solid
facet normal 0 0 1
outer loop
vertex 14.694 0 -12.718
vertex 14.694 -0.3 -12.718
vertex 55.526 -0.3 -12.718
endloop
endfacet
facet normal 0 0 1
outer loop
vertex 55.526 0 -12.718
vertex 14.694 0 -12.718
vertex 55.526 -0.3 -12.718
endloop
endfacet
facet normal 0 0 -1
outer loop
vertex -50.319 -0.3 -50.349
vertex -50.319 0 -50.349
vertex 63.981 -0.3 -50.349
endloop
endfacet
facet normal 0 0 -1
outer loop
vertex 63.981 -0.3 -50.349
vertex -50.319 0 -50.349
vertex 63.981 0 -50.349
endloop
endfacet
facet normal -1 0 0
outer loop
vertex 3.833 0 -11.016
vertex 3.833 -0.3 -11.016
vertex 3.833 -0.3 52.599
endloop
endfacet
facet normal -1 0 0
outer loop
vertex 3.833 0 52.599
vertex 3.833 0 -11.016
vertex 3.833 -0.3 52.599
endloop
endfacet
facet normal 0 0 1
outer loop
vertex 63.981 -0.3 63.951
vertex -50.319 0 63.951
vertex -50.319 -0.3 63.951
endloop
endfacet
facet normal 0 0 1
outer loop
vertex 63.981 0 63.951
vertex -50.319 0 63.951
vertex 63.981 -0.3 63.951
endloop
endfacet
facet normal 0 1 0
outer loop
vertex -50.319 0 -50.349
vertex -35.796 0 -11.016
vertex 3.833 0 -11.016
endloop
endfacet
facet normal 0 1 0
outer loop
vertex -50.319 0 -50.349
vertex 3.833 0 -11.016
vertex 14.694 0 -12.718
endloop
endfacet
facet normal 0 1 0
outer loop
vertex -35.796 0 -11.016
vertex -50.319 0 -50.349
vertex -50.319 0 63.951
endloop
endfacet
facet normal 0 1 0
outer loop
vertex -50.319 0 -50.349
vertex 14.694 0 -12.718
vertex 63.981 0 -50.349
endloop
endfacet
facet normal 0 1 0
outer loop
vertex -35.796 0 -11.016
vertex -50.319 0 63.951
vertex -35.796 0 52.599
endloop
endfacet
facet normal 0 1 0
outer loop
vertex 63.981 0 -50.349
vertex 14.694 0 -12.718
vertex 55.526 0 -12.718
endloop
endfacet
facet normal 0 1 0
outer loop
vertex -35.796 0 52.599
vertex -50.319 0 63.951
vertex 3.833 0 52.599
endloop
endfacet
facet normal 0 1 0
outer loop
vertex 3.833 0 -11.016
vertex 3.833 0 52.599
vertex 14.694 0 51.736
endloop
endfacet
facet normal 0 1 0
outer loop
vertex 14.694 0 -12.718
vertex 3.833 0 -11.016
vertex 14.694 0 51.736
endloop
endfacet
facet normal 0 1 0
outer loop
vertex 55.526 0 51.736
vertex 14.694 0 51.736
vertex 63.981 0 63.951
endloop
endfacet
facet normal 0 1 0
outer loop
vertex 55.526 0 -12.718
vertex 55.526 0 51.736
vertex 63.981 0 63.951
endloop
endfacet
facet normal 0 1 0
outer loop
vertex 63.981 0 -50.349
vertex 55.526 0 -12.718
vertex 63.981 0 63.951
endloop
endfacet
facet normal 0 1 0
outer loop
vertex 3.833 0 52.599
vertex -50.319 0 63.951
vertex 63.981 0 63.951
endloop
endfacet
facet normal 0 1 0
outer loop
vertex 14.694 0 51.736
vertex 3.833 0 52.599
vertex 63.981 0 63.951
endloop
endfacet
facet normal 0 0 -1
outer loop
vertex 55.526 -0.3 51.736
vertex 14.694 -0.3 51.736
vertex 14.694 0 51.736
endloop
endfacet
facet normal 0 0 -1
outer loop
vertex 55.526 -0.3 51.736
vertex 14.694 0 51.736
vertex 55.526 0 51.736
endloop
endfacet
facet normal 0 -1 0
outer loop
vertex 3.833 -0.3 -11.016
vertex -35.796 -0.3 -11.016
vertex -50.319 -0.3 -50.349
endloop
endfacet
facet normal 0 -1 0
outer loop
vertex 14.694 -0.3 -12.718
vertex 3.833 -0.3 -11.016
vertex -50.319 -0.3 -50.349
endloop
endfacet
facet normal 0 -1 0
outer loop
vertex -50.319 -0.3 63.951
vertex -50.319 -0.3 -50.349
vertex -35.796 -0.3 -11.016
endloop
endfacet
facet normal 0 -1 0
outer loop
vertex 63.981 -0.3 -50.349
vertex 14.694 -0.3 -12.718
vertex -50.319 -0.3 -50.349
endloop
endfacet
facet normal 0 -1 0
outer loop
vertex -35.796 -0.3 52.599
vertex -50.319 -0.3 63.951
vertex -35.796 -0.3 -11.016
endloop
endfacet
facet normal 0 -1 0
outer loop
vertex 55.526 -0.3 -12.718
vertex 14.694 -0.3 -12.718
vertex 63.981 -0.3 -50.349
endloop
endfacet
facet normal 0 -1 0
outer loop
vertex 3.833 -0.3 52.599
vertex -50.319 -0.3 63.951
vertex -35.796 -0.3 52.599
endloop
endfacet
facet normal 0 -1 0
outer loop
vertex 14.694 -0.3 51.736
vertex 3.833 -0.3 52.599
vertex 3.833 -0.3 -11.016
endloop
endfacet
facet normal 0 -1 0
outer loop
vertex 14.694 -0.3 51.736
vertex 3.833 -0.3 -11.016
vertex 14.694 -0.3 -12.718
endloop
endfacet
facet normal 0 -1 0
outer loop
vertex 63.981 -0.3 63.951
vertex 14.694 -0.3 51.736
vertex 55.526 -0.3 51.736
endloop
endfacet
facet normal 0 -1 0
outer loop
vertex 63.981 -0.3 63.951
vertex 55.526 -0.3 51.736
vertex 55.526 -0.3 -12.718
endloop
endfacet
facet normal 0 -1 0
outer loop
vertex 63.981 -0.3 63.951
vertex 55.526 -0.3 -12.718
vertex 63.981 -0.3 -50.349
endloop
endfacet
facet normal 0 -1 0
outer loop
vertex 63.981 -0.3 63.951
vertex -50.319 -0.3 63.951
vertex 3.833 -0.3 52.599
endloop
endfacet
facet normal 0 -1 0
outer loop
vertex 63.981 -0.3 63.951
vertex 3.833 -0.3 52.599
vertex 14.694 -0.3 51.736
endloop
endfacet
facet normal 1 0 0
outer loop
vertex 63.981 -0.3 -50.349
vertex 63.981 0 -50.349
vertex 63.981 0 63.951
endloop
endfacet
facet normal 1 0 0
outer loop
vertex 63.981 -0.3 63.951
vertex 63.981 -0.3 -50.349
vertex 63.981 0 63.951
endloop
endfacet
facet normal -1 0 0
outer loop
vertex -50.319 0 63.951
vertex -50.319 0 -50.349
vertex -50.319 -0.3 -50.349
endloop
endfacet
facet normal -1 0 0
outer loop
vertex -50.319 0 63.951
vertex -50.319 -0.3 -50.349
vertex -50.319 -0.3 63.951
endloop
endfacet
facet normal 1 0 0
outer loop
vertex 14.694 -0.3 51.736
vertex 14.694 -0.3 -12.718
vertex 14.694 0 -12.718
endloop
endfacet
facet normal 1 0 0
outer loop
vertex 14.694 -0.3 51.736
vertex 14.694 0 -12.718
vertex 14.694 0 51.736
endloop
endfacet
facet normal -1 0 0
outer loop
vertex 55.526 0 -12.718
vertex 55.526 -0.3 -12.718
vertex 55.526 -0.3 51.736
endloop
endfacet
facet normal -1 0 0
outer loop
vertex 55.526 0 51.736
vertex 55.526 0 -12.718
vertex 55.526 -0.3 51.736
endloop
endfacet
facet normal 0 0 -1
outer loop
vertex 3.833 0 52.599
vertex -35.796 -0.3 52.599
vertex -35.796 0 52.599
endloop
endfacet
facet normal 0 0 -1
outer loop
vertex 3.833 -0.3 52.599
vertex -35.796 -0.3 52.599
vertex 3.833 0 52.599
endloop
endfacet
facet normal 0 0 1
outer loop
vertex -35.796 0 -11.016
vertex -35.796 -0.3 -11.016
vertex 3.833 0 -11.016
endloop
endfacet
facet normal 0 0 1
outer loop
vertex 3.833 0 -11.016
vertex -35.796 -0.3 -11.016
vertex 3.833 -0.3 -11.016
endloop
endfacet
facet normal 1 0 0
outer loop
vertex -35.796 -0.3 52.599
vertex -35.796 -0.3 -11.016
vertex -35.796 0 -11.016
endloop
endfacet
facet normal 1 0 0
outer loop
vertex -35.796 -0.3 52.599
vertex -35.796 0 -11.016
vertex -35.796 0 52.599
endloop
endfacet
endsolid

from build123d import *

# Parameters (mm, degrees)
F0_W     = 114.3
F0_H     = 114.3
F1_DEPTH = 0.3
F2_W     = 39.628732
F2_H     = 63.614545
F3_DEPTH = 0.301
F4_W     = 40.832126
F4_H     = 64.454022
F5_DEPTH = 0.301


with BuildPart() as f1:
    # F0 (on Front) → F1 (new body)
    with BuildSketch(Plane.XZ):
        with Locations((6.831163, 6.801479)):
            Rectangle(F0_W, F0_H)
    extrude(amount=F1_DEPTH)

    # F2 (on face) → F3 (cut, through all)
    with BuildSketch(Plane.XZ.offset(0.3)):
        with Locations((-15.981431, 20.791628)):
            Rectangle(F2_W, F2_H)
    extrude(amount=-F3_DEPTH, mode=Mode.SUBTRACT)

    # F4 (on face) → F5 (cut, through all)
    with BuildSketch(Plane.XZ.offset(0.3)):
        with Locations((35.110194, 19.508778)):
            Rectangle(F4_W, F4_H)
    extrude(amount=-F5_DEPTH, mode=Mode.SUBTRACT)


solid = f1.part
